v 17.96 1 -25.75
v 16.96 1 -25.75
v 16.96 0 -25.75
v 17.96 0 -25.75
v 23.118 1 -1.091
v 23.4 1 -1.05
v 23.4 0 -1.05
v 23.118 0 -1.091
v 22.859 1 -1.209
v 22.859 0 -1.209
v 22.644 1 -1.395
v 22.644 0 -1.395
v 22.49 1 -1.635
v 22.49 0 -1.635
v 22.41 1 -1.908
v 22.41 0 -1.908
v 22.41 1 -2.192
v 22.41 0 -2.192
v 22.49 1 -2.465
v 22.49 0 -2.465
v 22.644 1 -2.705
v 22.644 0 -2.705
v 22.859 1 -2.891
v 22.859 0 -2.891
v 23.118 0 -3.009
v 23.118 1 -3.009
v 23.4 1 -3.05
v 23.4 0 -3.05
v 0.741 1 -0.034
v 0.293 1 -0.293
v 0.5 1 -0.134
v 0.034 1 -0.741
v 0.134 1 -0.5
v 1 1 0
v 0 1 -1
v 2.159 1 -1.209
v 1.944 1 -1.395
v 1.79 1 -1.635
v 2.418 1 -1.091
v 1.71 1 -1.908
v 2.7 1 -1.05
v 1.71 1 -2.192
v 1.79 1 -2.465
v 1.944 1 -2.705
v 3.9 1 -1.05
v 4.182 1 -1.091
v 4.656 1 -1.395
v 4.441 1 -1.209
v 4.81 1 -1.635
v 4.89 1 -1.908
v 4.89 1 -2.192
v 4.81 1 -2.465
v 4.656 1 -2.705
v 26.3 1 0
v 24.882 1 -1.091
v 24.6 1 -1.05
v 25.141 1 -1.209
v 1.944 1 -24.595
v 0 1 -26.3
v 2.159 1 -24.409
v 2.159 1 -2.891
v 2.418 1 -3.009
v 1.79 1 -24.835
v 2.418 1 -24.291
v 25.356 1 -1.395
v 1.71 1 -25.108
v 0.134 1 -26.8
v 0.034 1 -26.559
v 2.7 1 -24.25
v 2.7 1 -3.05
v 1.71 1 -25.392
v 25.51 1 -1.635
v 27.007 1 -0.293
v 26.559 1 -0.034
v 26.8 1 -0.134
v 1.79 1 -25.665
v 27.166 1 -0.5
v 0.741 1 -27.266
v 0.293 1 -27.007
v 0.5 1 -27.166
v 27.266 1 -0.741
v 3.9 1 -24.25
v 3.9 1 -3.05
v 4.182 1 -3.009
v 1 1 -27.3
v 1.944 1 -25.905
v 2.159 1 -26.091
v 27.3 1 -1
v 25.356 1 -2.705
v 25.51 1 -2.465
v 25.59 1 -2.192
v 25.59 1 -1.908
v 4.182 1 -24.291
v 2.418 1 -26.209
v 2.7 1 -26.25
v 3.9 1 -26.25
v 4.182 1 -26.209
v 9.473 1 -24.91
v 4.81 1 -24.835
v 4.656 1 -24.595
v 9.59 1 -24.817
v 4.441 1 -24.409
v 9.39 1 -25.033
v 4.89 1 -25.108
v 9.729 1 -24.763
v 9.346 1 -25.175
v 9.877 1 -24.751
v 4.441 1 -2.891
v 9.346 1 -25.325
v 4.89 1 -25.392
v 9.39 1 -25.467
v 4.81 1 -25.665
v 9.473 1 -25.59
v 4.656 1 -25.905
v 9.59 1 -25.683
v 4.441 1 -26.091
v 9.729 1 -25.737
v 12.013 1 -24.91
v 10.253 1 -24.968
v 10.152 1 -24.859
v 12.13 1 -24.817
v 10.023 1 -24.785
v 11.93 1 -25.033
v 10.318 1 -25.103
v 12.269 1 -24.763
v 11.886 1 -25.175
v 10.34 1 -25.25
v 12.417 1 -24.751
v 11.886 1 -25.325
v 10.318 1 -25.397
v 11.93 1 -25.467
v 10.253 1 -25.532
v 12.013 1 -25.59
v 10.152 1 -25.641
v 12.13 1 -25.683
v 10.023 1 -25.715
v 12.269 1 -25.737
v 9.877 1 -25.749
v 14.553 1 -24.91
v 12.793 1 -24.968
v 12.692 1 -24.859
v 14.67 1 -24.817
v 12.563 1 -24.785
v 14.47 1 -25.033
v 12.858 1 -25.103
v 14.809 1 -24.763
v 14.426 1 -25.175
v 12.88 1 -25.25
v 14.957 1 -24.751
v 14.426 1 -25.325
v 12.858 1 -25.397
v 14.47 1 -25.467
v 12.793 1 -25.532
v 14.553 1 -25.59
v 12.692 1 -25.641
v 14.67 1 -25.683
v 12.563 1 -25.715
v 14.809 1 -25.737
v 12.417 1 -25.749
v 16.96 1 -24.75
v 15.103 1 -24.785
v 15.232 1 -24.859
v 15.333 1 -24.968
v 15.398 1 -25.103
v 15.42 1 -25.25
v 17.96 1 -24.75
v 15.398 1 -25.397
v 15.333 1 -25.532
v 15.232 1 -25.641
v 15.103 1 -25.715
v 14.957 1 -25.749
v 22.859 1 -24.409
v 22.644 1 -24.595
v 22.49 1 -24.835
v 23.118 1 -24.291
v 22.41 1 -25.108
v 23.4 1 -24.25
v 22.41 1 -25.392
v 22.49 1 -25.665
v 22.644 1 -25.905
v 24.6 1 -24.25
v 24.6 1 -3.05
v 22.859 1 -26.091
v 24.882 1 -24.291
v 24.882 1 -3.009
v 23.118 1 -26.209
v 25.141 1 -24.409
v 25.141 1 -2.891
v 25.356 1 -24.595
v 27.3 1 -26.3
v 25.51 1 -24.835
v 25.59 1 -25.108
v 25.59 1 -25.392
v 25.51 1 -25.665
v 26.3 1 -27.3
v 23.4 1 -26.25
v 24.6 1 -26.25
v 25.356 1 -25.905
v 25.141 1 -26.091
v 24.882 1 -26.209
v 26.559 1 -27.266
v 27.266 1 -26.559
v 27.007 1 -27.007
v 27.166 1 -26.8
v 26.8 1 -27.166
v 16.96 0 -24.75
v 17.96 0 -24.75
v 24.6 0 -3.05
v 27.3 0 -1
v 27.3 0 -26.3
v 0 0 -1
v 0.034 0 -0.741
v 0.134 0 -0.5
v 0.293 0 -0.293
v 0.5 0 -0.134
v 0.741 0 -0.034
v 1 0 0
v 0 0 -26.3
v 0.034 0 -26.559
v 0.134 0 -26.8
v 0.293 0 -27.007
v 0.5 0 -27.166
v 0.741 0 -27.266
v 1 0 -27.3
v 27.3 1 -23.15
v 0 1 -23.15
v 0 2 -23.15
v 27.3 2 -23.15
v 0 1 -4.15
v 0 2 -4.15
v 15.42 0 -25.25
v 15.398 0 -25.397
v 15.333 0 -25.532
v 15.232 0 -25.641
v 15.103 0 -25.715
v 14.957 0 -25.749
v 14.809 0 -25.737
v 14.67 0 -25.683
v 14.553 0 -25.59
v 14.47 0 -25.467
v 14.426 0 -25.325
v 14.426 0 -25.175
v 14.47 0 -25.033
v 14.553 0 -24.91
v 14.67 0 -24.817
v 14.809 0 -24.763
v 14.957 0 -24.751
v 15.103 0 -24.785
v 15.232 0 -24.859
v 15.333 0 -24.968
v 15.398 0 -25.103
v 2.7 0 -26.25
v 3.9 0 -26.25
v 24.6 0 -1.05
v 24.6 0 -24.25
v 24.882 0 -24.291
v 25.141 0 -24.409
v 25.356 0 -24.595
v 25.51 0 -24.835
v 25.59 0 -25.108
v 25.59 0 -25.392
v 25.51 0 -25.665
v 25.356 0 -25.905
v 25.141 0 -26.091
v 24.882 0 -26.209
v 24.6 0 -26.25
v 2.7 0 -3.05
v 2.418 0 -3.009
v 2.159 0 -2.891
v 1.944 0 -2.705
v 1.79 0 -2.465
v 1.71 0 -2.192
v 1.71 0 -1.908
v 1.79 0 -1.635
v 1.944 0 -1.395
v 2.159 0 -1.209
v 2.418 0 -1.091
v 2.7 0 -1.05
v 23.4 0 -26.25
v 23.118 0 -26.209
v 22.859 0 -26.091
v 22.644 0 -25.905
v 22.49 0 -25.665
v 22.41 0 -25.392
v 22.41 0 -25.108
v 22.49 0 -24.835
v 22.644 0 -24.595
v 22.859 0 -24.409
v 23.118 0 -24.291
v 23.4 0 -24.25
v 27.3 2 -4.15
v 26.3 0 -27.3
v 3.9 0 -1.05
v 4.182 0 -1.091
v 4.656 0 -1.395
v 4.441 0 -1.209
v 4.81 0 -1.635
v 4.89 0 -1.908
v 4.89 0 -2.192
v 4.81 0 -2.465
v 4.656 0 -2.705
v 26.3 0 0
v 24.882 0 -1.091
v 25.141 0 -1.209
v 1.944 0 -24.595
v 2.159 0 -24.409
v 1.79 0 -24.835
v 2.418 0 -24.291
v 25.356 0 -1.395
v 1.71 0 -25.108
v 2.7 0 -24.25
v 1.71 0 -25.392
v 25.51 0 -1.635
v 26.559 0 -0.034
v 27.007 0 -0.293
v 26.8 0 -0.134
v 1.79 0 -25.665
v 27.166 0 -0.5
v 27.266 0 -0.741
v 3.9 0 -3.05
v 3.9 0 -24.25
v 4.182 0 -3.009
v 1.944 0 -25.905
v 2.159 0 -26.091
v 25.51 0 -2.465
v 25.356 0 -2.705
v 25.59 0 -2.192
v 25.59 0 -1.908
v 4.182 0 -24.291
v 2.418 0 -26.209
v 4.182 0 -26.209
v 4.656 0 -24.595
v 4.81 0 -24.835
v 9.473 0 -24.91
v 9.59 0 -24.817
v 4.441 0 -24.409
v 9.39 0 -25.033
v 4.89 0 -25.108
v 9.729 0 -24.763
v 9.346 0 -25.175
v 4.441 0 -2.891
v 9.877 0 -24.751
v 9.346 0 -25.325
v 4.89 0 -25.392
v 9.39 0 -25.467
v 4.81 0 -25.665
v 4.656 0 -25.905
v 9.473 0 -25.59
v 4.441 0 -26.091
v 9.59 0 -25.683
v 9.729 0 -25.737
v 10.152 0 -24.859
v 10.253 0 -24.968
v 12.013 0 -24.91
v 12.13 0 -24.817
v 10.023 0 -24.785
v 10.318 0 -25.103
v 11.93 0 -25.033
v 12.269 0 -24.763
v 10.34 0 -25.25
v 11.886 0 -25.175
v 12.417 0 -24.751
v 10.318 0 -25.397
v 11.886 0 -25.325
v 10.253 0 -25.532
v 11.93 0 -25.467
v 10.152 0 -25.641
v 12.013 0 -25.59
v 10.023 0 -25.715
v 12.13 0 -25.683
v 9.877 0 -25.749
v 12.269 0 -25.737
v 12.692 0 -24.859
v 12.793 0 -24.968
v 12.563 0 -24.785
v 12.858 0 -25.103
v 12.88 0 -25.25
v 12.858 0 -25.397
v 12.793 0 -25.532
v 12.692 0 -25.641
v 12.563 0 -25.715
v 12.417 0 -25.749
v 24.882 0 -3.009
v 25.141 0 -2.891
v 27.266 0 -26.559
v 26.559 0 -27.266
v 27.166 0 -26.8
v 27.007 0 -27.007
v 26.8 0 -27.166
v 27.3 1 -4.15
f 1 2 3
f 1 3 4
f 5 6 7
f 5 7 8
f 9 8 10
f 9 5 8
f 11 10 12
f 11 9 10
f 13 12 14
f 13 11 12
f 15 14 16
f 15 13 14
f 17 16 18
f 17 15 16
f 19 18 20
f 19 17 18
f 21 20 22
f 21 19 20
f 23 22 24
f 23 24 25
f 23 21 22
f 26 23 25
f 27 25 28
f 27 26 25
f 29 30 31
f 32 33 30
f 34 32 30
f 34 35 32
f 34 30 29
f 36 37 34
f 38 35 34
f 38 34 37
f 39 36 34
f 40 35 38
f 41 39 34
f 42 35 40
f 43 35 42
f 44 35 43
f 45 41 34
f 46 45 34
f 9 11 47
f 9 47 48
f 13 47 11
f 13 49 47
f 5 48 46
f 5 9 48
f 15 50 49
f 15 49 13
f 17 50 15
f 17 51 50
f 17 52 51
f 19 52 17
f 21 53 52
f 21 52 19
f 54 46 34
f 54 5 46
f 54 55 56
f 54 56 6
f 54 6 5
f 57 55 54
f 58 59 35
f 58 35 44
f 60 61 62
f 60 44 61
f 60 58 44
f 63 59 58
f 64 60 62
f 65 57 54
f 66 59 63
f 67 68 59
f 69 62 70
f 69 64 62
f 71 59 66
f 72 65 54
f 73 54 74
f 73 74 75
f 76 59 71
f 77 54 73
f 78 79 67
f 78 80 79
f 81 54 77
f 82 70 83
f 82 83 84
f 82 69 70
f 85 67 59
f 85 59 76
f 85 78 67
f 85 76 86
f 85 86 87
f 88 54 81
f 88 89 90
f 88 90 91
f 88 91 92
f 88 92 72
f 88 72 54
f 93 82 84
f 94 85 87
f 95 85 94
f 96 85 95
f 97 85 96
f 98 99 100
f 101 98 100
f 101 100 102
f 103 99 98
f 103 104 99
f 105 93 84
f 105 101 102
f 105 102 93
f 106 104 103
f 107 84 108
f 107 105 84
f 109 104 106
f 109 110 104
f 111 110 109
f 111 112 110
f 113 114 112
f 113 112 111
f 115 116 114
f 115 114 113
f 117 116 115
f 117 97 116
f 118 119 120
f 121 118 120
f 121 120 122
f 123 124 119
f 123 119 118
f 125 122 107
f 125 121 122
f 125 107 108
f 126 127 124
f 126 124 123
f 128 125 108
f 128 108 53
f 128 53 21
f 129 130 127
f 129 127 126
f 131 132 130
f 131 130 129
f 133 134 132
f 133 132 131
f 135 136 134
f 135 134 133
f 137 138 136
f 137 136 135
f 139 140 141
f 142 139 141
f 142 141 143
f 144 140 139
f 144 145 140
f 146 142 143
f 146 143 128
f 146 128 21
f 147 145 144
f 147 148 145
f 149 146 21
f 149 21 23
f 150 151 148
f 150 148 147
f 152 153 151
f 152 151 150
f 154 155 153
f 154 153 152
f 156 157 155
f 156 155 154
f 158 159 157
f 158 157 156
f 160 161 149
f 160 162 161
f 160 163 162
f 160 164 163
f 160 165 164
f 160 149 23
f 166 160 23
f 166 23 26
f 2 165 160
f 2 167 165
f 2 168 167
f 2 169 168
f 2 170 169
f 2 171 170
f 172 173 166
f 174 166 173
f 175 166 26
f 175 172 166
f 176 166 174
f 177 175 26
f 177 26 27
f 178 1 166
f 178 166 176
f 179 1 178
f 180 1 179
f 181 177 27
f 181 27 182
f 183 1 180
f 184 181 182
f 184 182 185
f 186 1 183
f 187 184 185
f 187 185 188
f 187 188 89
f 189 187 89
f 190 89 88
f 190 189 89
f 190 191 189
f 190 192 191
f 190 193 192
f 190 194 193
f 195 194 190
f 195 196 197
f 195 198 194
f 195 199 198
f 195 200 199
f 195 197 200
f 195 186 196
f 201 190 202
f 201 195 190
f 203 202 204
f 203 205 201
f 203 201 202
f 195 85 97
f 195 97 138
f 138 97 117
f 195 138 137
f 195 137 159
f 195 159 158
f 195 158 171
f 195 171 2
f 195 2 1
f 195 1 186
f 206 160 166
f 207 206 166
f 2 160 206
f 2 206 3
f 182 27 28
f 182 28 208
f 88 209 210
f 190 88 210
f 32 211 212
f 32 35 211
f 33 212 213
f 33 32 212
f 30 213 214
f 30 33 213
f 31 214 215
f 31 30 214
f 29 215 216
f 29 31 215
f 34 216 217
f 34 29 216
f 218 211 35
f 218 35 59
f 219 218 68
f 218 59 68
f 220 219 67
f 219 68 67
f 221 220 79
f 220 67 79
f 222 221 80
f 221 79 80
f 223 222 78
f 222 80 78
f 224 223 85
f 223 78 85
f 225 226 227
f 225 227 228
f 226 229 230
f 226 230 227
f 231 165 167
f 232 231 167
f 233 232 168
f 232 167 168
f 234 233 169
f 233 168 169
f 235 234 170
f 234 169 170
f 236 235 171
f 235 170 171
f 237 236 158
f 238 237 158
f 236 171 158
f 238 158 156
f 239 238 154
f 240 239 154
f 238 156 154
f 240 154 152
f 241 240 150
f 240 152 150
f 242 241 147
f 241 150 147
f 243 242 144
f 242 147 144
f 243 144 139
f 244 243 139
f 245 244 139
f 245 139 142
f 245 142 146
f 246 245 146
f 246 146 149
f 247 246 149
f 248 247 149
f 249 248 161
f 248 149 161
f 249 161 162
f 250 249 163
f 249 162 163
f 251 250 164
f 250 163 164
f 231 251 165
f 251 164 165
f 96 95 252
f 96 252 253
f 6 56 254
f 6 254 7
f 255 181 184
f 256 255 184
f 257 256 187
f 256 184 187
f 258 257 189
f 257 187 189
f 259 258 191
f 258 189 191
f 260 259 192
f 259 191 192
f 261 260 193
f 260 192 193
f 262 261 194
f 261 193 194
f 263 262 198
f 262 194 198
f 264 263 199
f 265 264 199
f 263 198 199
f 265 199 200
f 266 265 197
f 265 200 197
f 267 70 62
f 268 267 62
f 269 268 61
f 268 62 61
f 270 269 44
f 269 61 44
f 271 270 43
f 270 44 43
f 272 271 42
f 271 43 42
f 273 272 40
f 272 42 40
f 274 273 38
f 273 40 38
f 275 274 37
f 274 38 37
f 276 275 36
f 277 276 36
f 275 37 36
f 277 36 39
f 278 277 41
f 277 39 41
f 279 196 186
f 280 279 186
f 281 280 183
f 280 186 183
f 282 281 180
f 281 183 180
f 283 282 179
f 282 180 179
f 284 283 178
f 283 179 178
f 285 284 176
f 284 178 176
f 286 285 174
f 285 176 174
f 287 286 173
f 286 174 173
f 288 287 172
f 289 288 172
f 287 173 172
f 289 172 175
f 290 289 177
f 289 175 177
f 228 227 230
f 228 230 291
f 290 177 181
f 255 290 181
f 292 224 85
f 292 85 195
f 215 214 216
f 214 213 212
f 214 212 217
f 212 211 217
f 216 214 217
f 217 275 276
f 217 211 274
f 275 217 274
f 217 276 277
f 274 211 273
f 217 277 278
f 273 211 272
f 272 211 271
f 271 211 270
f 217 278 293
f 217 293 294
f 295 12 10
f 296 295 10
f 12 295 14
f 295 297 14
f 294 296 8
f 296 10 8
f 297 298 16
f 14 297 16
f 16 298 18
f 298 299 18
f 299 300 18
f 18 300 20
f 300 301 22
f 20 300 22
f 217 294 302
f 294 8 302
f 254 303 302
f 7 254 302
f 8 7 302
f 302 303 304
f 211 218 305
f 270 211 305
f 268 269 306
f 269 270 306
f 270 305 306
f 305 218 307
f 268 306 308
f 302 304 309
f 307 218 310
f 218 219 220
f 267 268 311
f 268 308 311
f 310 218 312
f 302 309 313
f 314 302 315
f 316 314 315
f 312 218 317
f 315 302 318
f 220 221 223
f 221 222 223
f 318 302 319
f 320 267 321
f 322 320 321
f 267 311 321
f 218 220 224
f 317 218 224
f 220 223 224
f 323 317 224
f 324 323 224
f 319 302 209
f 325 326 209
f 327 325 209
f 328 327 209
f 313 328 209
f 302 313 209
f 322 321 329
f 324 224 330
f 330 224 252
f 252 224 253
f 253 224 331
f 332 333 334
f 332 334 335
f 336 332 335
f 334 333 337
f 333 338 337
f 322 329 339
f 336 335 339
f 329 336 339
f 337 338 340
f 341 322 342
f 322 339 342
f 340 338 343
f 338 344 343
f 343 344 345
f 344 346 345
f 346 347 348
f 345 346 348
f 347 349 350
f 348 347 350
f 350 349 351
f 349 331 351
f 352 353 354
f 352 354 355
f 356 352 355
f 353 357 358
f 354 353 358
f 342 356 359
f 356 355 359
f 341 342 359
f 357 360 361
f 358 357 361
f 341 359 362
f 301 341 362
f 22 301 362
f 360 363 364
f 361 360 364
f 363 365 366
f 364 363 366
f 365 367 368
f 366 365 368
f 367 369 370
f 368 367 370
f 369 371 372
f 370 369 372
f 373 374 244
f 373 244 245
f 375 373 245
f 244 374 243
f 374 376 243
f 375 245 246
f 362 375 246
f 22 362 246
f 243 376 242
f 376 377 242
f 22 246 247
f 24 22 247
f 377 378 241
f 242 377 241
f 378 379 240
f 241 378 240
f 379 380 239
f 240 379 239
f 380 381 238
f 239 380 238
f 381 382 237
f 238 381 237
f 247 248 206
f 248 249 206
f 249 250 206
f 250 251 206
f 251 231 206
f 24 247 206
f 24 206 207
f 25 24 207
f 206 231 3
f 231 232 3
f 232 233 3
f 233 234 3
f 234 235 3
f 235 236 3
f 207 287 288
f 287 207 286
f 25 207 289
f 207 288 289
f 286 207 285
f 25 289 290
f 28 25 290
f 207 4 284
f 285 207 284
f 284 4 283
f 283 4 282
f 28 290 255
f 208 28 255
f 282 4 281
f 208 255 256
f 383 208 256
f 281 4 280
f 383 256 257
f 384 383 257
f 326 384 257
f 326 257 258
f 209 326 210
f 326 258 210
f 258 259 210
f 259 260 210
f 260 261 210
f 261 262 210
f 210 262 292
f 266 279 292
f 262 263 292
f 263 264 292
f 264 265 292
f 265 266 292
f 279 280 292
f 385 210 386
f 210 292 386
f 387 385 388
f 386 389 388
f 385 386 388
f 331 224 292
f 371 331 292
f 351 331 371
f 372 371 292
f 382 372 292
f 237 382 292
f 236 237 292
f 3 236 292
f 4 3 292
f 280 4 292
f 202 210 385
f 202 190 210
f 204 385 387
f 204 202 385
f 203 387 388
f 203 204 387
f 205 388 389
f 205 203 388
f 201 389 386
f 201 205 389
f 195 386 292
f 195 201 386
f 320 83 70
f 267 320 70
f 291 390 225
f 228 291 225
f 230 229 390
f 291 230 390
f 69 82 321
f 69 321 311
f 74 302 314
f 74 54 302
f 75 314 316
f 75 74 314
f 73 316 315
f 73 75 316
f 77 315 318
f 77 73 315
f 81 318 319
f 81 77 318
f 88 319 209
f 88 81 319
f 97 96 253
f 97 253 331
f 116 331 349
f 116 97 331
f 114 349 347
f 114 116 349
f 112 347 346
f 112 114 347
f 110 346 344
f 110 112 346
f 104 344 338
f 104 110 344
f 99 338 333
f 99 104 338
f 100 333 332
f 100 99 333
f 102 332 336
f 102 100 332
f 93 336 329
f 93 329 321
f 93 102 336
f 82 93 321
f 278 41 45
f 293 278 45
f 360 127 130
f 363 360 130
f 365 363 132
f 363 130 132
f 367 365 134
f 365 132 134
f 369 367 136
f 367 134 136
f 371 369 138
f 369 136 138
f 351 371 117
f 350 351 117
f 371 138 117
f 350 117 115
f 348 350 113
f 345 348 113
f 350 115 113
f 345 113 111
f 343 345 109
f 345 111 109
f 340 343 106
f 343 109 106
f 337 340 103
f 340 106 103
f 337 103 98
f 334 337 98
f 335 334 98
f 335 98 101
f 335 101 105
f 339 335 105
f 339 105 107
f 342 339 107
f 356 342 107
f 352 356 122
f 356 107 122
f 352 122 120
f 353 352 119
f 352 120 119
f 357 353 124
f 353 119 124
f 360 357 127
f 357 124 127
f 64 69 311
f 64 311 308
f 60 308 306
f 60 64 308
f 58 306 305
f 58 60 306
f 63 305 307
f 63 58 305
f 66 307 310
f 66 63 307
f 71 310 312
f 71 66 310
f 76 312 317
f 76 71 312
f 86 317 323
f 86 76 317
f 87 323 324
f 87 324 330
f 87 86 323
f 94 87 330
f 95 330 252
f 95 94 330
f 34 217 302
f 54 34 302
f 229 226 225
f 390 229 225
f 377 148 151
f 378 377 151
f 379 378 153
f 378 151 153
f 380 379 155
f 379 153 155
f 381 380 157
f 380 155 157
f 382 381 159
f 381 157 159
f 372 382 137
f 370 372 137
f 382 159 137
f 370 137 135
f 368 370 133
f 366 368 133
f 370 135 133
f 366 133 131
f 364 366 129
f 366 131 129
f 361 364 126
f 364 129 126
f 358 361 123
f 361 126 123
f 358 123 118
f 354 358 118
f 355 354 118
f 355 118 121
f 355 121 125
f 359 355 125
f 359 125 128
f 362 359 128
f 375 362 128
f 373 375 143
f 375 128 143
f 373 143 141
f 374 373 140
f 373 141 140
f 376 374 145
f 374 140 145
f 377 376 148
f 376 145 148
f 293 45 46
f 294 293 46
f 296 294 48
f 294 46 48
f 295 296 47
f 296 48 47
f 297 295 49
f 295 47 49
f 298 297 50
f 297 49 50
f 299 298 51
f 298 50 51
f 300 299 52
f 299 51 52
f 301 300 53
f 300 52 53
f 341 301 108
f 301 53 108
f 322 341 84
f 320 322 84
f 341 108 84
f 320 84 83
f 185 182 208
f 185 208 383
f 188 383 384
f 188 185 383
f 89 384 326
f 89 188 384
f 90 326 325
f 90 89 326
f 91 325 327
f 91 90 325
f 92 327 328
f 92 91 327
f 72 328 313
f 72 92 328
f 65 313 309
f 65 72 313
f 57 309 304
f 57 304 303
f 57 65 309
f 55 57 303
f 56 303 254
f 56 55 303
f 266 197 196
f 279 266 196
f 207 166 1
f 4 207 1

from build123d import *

# Parameters (mm, degrees)
SKICA1_W                 = 27.3
SKICA1_H                 = 27.3
P_IDAT_VYSUNUT_M1_DEPTH  = 1
SKICA2_W                 = 27.3
SKICA2_H                 = 19
P_IDAT_VYSUNUT_M2_DEPTH  = 1
ZAOBLIT1_R               = 1
SKICA3_R                 = 0.5
SKICA3_W                 = 1
SKICA3_H                 = 1
ODEBRAT_VYSUNUT_M1_DEPTH = 1


with BuildPart() as part:
    # Skica1 → Přidat vysunutím1 (new body)
    with BuildSketch(Plane(origin=(0, 0, 0), x_dir=(1, 0, 0), z_dir=(0, 1, 0))):
        with Locations((13.65, 13.65)):
            Rectangle(SKICA1_W, SKICA1_H)
    extrude(amount=P_IDAT_VYSUNUT_M1_DEPTH)

    # Zaoblit1
    zaoblit1_edges = [part.edges().sort_by_distance(p)[0] for p in [
        (0, 0.5, -27.3),
        (27.3, 0.5, -27.3),
        (27.3, 0.5, 0),
        (0, 0.5, 0),
    ]]
    fillet(zaoblit1_edges, radius=ZAOBLIT1_R)

    # Skica3 → Odebrat vysunutím1 (cut)
    with BuildSketch(Plane(origin=(0, 1, 0), x_dir=(1, 0, 0), z_dir=(0, 1, 0))):
        with Locations((9.84, 25.25)):
            Circle(SKICA3_R)
        with Locations((12.38, 25.25)):
            Circle(SKICA3_R)
        with Locations((14.92, 25.25)):
            Circle(SKICA3_R)
        with BuildLine():
            Line((2.7, 26.25), (3.9, 26.25))
            ThreePointArc((3.9, 26.25), (4.9, 25.25), (3.9, 24.25))
            Line((3.9, 24.25), (2.7, 24.25))
            ThreePointArc((2.7, 24.25), (1.7, 25.25), (2.7, 26.25))
        make_face()
        with BuildLine():
            Line((24.6, 26.25), (23.4, 26.25))
            ThreePointArc((23.4, 26.25), (22.4, 25.25), (23.4, 24.25))
            Line((23.4, 24.25), (24.6, 24.25))
            ThreePointArc((24.6, 24.25), (25.6, 25.25), (24.6, 26.25))
        make_face()
        with BuildLine():
            Line((2.7, 1.05), (3.9, 1.05))
            ThreePointArc((3.9, 1.05), (4.9, 2.05), (3.9, 3.05))
            Line((3.9, 3.05), (2.7, 3.05))
            ThreePointArc((2.7, 3.05), (1.7, 2.05), (2.7, 1.05))
        make_face()
        with BuildLine():
            Line((24.6, 1.05), (23.4, 1.05))
            ThreePointArc((23.4, 1.05), (22.4, 2.05), (23.4, 3.05))
            Line((23.4, 3.05), (24.6, 3.05))
            ThreePointArc((24.6, 3.05), (25.6, 2.05), (24.6, 1.05))
        make_face()
        with Locations((17.46, 25.25)):
            Rectangle(SKICA3_W, SKICA3_H)
    extrude(amount=-ODEBRAT_VYSUNUT_M1_DEPTH, mode=Mode.SUBTRACT)


with BuildPart() as body_2:
    # Skica2 → Přidat vysunutím2 (new body)
    with BuildSketch(Plane(origin=(0, 1, 0), x_dir=(1, 0, 0), z_dir=(0, 1, 0))):
        with Locations((13.65, 13.65)):
            Rectangle(SKICA2_W, SKICA2_H)
    extrude(amount=P_IDAT_VYSUNUT_M2_DEPTH)


solid = Compound([part.part, body_2.part])
